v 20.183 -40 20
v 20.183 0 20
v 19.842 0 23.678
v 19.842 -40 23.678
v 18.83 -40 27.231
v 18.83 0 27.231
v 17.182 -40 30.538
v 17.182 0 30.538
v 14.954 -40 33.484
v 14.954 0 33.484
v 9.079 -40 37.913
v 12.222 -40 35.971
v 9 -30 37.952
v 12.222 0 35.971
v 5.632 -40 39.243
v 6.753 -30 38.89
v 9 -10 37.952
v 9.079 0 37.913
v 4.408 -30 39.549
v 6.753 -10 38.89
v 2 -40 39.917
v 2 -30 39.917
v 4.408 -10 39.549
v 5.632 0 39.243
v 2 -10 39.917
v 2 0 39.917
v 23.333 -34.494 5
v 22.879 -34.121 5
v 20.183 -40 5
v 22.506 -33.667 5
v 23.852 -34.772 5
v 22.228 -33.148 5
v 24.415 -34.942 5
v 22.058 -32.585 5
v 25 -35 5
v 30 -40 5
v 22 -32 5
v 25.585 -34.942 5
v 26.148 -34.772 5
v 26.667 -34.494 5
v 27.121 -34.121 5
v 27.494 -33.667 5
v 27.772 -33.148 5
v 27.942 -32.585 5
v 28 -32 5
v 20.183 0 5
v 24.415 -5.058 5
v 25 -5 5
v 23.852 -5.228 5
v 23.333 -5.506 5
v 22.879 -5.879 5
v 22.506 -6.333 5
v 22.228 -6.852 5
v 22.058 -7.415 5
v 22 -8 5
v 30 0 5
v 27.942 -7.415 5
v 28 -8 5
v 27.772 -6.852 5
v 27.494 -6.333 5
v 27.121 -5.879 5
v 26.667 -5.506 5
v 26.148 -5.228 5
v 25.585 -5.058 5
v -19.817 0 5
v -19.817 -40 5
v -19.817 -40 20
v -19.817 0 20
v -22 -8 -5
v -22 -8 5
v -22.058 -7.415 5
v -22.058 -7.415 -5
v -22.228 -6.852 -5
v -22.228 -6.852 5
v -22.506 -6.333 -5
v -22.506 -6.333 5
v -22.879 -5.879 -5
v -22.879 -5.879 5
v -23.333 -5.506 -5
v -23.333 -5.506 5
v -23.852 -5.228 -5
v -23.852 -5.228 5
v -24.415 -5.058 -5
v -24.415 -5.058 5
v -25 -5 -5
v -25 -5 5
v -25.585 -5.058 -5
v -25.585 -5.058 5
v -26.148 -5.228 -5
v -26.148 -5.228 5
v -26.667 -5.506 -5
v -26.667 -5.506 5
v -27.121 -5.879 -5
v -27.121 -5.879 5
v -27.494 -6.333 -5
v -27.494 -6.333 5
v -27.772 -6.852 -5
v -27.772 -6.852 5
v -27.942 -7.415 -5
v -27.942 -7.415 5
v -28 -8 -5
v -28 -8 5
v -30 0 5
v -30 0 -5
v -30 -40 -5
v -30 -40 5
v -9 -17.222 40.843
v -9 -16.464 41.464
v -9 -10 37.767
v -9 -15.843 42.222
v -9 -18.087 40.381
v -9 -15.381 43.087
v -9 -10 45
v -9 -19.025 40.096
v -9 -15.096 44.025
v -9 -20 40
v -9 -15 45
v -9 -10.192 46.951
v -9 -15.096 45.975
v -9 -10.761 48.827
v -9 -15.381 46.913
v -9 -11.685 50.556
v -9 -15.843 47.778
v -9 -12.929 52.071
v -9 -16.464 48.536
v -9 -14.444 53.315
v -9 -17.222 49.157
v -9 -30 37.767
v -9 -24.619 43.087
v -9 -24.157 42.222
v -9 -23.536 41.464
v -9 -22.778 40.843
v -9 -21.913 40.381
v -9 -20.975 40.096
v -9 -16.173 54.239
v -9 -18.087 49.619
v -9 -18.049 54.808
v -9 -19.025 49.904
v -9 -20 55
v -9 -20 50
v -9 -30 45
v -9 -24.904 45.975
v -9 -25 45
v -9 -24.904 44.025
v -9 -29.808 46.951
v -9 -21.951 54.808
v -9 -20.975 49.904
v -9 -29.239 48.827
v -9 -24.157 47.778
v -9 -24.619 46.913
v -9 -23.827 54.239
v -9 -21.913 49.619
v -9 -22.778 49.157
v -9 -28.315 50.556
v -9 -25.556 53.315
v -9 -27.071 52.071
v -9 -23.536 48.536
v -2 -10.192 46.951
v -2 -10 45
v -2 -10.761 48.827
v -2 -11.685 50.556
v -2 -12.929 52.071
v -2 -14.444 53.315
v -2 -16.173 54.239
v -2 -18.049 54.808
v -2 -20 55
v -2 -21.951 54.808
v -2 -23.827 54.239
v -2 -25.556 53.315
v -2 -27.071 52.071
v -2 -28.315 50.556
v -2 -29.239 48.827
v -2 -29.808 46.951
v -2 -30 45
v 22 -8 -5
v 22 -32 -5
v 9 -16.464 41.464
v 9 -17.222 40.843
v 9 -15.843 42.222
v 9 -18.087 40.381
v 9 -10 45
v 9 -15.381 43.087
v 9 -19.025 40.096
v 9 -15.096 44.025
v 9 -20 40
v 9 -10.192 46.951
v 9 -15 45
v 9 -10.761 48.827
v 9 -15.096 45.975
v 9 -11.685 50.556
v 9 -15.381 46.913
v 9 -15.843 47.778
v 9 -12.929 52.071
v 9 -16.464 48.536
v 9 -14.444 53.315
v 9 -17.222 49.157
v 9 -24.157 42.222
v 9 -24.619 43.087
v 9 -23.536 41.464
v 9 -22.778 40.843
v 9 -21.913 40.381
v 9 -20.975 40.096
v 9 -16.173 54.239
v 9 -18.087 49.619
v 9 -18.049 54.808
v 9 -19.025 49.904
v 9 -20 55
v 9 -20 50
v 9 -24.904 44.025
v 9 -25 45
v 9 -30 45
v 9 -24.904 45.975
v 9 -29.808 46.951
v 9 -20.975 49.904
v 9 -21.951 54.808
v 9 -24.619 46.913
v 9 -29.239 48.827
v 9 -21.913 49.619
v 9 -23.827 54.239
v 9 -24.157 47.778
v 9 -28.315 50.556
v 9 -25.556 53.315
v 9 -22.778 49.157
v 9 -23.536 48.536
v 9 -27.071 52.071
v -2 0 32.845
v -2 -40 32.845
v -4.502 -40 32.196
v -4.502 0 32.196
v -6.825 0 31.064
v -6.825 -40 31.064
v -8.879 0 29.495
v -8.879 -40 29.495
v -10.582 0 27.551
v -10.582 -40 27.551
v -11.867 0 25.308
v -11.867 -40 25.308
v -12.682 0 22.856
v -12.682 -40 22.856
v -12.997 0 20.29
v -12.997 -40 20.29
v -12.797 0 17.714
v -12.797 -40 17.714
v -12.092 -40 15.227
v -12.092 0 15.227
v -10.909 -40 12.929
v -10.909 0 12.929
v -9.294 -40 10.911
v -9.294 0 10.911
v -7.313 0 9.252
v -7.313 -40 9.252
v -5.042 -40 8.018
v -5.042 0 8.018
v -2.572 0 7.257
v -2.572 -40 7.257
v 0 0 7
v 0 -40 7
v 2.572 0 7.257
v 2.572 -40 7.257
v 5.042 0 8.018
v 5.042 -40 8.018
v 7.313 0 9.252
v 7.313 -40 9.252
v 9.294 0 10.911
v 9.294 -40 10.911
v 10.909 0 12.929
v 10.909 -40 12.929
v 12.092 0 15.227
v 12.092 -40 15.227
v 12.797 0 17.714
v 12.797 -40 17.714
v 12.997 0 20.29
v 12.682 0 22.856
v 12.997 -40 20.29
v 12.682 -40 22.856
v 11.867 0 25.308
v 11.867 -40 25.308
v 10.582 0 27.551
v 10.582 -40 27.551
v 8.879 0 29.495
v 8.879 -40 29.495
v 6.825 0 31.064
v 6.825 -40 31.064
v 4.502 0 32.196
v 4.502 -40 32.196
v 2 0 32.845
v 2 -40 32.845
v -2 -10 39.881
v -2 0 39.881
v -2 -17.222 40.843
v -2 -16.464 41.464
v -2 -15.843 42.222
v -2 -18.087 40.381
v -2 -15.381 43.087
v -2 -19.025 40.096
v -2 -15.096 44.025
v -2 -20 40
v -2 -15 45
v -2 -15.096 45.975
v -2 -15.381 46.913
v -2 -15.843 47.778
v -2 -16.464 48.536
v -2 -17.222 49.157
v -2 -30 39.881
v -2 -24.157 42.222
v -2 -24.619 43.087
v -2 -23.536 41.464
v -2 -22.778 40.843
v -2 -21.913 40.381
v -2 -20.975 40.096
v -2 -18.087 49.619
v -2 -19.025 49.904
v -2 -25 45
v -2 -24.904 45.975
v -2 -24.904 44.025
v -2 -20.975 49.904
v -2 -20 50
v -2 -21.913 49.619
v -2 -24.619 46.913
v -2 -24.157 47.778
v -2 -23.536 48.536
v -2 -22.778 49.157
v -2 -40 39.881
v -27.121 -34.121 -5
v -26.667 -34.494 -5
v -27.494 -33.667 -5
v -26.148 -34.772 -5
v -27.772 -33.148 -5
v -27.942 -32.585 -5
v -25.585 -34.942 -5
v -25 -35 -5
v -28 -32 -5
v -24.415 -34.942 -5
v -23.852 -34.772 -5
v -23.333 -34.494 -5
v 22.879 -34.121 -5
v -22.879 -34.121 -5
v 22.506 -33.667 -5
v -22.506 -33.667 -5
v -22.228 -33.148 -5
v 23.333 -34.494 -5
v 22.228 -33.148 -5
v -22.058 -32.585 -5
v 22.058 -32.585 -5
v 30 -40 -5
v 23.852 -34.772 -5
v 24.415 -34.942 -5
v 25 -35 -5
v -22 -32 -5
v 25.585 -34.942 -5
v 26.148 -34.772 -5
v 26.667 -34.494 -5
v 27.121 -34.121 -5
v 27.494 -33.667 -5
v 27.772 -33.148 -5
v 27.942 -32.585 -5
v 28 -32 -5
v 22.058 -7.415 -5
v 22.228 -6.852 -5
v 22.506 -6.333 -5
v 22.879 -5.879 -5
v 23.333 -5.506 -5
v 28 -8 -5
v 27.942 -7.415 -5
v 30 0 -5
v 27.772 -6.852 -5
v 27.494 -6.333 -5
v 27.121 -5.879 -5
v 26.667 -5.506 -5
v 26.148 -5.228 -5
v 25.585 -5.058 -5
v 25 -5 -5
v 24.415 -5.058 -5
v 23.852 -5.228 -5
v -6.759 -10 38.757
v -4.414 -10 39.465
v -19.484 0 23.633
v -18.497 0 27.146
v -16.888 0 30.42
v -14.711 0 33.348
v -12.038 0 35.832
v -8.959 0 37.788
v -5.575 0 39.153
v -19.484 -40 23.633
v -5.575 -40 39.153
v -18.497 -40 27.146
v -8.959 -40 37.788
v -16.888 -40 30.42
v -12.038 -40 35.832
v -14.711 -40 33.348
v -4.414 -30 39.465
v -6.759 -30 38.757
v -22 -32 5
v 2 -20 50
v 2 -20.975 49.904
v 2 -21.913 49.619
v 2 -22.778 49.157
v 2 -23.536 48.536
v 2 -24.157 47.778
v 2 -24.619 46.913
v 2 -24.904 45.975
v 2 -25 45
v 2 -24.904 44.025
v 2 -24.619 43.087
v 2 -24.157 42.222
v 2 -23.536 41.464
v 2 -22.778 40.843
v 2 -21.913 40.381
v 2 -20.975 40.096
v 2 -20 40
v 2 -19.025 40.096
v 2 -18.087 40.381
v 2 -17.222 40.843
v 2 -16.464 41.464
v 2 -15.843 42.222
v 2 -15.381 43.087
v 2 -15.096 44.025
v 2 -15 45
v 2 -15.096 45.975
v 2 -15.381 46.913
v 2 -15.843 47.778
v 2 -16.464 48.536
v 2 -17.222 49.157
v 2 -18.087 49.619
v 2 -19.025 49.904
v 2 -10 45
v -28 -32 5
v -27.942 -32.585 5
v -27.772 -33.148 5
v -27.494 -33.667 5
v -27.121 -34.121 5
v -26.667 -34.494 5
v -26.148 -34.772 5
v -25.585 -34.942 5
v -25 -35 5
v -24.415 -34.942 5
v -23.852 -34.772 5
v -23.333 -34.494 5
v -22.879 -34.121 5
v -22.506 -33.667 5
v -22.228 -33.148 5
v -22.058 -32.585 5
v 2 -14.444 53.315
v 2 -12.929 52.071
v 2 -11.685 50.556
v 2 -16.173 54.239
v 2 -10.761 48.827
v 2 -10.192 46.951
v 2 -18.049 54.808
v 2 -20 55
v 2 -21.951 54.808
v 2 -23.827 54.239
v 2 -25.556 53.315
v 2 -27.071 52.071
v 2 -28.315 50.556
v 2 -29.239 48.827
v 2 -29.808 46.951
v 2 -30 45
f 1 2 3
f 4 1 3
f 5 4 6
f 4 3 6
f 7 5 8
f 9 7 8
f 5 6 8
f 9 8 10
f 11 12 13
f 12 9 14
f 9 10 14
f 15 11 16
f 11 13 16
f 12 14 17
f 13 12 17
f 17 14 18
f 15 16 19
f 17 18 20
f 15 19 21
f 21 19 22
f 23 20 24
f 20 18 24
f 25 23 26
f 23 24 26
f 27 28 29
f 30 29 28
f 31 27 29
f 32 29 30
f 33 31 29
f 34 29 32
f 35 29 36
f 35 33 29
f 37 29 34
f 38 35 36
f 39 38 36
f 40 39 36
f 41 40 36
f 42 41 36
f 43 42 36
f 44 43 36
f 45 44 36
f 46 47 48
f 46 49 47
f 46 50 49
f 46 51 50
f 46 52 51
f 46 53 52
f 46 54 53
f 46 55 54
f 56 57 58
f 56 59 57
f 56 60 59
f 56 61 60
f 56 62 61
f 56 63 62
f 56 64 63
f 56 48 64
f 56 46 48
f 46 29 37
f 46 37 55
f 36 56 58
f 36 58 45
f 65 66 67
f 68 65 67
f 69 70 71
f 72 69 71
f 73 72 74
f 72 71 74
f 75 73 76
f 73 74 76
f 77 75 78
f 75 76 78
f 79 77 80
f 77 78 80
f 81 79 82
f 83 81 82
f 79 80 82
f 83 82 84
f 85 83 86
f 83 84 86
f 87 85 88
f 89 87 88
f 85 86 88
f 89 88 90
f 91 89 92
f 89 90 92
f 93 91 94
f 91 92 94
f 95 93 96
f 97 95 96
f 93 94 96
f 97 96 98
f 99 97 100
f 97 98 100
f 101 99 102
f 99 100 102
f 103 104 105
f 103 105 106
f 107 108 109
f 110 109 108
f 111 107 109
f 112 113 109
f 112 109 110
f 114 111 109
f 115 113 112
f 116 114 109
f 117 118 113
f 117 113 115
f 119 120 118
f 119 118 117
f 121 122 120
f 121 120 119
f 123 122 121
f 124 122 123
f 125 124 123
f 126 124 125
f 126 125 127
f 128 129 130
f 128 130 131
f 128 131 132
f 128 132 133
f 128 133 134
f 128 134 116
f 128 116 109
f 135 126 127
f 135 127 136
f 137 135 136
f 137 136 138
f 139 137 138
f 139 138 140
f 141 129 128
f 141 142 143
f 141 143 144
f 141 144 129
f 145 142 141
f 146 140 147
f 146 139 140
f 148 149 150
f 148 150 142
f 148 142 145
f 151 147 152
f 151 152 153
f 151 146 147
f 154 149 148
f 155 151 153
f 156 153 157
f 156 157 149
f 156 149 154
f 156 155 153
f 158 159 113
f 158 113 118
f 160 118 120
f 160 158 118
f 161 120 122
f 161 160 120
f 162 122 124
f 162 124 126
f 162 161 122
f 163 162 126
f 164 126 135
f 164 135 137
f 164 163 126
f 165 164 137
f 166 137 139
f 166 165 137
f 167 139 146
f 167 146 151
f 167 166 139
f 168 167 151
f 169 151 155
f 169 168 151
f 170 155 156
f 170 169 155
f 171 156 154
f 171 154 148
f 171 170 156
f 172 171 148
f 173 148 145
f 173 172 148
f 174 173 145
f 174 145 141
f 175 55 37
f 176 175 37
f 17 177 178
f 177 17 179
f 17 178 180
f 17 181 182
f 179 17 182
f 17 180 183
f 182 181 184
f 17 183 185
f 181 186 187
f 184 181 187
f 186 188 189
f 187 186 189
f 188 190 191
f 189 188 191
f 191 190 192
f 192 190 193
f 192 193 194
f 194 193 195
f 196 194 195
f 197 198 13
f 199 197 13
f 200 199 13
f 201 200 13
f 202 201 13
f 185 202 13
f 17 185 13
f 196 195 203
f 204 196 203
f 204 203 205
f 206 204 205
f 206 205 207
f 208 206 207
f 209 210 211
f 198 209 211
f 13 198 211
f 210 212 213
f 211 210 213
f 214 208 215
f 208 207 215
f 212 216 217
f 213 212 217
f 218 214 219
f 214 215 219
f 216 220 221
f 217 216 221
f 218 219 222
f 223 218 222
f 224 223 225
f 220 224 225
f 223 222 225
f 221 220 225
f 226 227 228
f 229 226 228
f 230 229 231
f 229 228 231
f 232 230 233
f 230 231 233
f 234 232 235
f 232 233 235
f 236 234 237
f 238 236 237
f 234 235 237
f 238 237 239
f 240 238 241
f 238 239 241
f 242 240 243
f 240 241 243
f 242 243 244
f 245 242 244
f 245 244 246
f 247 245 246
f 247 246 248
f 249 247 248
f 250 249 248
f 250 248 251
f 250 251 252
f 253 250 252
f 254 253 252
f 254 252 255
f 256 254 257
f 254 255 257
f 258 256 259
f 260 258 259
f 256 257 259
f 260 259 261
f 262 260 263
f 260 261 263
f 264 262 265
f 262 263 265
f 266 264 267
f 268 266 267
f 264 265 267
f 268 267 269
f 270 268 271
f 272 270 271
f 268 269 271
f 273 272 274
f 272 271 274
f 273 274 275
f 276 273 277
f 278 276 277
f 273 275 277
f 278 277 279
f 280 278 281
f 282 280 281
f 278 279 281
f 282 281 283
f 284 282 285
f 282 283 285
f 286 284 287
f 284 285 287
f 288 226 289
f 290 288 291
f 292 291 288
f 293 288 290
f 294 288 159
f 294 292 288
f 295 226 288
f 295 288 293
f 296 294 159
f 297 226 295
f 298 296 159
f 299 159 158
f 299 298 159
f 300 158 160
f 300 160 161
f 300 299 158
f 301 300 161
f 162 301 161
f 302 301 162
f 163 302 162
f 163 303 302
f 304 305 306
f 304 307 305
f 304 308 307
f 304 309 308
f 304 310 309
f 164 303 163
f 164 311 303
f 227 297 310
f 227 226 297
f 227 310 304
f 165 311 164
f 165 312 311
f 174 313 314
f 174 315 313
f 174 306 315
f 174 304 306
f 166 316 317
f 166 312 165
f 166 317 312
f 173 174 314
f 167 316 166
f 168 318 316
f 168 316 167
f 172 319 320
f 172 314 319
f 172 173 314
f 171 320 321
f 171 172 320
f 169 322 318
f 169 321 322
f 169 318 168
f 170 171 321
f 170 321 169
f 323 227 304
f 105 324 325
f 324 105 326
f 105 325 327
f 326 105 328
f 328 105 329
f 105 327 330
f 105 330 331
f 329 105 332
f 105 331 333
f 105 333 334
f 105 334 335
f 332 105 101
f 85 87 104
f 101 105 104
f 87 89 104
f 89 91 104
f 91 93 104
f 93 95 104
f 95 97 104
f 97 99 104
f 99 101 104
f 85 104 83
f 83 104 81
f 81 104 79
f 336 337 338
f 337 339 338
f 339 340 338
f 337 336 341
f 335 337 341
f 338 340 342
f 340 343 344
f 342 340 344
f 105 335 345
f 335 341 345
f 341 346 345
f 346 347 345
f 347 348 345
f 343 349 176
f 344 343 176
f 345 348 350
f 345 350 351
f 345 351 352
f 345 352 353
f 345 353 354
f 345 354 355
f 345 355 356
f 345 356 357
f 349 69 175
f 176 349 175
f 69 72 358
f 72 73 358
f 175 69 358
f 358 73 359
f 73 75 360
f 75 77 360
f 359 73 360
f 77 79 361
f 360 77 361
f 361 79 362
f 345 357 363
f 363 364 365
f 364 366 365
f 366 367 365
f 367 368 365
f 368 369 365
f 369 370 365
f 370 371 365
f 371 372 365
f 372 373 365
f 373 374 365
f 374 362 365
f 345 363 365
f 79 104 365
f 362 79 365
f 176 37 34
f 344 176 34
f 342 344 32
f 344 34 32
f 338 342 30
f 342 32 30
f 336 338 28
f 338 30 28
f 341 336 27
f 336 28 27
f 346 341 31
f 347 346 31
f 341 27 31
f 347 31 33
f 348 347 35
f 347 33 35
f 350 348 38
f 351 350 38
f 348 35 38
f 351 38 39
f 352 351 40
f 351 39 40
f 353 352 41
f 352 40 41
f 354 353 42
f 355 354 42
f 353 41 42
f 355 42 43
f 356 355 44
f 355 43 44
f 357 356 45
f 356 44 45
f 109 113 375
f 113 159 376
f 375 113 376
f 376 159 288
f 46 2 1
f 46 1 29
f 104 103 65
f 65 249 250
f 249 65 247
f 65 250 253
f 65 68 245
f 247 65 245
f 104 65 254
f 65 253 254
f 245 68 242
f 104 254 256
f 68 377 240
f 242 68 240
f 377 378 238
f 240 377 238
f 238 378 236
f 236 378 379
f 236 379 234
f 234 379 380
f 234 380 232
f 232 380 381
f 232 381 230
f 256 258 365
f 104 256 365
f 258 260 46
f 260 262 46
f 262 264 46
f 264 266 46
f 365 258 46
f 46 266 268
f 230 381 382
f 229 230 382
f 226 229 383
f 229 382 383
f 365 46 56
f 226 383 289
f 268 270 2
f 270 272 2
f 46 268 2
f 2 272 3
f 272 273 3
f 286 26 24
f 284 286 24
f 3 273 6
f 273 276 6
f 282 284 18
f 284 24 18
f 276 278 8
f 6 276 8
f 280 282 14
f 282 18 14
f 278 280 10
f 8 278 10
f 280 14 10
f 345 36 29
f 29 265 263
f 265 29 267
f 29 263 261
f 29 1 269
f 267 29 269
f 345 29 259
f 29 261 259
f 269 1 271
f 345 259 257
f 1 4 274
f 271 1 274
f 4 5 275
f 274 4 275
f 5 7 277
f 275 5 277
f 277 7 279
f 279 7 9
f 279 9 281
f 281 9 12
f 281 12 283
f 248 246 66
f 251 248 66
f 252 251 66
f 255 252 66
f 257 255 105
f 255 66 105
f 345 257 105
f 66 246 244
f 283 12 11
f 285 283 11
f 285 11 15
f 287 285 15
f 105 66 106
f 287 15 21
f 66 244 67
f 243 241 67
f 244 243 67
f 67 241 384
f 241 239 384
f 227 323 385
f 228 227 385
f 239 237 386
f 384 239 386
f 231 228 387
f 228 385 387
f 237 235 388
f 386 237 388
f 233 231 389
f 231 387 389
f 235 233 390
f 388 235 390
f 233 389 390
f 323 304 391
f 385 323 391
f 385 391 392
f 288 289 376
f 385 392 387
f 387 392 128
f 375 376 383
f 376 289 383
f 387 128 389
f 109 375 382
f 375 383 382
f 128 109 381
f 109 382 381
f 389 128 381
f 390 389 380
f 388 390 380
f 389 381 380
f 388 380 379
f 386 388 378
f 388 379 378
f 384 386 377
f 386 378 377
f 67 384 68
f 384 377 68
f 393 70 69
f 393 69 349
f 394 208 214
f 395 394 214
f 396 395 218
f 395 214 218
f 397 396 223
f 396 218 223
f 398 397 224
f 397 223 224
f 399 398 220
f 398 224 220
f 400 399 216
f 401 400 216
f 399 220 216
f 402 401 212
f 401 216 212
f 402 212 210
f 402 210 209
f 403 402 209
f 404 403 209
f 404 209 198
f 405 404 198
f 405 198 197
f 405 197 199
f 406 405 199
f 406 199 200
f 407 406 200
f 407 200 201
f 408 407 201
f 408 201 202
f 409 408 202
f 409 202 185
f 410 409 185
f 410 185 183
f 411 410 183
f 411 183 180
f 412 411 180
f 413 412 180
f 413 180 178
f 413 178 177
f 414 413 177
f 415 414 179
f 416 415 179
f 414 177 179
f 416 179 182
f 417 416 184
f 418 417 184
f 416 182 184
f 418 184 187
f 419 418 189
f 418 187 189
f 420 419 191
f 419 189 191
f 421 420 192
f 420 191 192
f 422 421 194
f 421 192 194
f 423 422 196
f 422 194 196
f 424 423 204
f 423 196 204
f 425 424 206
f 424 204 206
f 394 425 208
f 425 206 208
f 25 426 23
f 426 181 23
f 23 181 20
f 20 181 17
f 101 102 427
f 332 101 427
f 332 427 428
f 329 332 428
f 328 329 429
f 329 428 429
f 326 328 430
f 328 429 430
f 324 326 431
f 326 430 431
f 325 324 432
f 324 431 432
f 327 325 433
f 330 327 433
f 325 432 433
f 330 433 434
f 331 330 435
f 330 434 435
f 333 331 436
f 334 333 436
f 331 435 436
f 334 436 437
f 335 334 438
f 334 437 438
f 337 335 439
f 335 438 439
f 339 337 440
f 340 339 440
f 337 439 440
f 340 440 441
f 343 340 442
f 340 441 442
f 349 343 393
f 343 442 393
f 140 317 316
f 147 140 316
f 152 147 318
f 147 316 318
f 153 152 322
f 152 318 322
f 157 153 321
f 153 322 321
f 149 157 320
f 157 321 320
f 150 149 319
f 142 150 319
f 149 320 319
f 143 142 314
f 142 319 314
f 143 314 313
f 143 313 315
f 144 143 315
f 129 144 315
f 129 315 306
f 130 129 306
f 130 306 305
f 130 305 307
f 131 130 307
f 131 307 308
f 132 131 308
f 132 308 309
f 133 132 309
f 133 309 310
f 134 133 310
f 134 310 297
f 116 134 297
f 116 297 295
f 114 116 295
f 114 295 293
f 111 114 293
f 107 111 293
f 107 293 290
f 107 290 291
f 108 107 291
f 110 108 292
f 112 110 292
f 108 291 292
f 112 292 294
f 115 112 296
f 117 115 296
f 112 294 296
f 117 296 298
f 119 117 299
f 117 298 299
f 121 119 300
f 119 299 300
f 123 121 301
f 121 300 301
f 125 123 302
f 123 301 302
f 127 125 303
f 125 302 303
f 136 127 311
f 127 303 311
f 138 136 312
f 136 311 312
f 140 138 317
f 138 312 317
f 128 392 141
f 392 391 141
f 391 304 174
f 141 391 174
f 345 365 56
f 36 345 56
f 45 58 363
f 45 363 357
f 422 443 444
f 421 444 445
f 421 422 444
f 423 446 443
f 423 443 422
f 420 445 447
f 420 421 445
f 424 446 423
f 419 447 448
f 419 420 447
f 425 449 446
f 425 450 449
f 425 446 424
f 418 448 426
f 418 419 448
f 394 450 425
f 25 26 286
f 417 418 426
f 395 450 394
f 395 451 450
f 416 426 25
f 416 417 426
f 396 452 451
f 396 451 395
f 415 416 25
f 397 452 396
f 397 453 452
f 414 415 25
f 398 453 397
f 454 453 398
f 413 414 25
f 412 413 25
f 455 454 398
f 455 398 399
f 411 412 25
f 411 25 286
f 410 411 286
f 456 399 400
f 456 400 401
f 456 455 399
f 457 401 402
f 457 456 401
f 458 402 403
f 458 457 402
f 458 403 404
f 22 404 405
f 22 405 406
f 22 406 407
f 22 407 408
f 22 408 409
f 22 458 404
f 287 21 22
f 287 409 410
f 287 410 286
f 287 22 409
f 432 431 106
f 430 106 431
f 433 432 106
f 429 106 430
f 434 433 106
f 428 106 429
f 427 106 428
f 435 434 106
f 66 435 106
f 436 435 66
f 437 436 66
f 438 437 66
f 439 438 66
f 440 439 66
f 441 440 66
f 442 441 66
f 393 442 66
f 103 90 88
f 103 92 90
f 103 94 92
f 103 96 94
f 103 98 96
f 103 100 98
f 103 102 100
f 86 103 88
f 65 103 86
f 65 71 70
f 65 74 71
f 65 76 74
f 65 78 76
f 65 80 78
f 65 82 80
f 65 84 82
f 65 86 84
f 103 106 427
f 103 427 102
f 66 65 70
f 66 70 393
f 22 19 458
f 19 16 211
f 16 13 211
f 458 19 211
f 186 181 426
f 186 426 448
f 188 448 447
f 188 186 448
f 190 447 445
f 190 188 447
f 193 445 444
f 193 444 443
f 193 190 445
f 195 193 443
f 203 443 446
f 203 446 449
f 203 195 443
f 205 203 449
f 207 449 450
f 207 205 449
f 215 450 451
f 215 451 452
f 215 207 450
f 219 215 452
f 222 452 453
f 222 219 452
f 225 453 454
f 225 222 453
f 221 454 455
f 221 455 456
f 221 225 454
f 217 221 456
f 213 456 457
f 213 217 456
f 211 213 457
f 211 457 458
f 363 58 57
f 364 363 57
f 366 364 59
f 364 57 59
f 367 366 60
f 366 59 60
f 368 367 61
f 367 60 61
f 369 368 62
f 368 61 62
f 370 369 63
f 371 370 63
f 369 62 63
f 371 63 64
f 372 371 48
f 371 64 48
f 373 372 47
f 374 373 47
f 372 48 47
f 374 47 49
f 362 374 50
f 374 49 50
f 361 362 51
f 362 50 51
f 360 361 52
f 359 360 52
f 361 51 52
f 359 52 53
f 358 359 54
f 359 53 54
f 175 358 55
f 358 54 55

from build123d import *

# Parameters (mm, degrees)
SKETCH_W          = 60
SKETCH_H          = 10
PAD_DEPTH         = 40
PAD001_DEPTH      = 40
PAD002_DEPTH      = 9
PAD002_DEPTH_BACK = 9
SKETCH003_R       = 5
POCKET_DEPTH      = 18
POCKET001_DEPTH   = 40
POCKET002_DEPTH   = 10


with BuildPart() as part:
    # Sketch → Pad (new body)
    with BuildSketch(Plane.XZ):
        Rectangle(SKETCH_W, SKETCH_H)
    extrude(amount=PAD_DEPTH)

    # Sketch001 → Pad001 (join)
    with BuildSketch(Plane.XZ):
        with BuildLine():
            Line((-19.816975, 4.999952), (-19.816975, 20))
            ThreePointArc((20.183025, 19.999952), (0.183049, 40), (-19.816975, 20))
            Line((20.183025, 19.999952), (20.183025, 4.999952))
            Line((20.183025, 4.999952), (-19.816975, 4.999952))
        make_face()
    extrude(amount=PAD001_DEPTH)

    # Sketch002 → Pad002 (join, two sides)
    with BuildSketch(Plane.YZ) as pad002_sk:
        with BuildLine():
            Line((-30, 25), (-30, 45))
            ThreePointArc((-10, 45), (-20, 55), (-30, 45))
            Line((-10, 45), (-10, 25))
            Line((-10, 25), (-30, 25))
        make_face()
    extrude(amount=PAD002_DEPTH)
    extrude(pad002_sk.sketch, amount=-PAD002_DEPTH_BACK)

    # Sketch003 (on Face17 of Pad002) → Pocket (cut)
    with BuildSketch(Plane(origin=(9, 0, 0), x_dir=(0, 0, 1), z_dir=(1, 0, 0))):
        with Locations((45, 20)):
            Circle(SKETCH003_R)
    extrude(amount=-POCKET_DEPTH, mode=Mode.SUBTRACT)

    # Sketch004 (on Face12 of Pocket) → Pocket001 (cut)
    with BuildSketch(Plane.XZ.offset(40)):
        with BuildLine():
            ThreePointArc((-2, 32.845233), (0, 7), (2, 32.845233))
            Line((2, 57.141209), (2, 32.845233))
            Line((-2, 57.141209), (2, 57.141209))
            Line((-2, 32.845233), (-2, 57.141209))
        make_face()
    extrude(amount=-POCKET001_DEPTH, mode=Mode.SUBTRACT)

    # Sketch005 (on Face8 of Pocket001) → Pocket002 (cut)
    with BuildSketch(Plane(origin=(0, 0, 5), x_dir=(-1, 0, 0), z_dir=(0, 0, 1))):
        with BuildLine():
            ThreePointArc((-28, 8), (-25, 5), (-22, 8))
            Line((-22, 8), (-22, 32))
            ThreePointArc((-22, 32), (-25, 35), (-28, 32))
            Line((-28, 8), (-28, 32))
        make_face()
        with BuildLine():
            ThreePointArc((22, 8), (25, 5), (28, 8))
            Line((28, 8), (28, 32))
            ThreePointArc((28, 32), (25, 35), (22, 32))
            Line((22, 8), (22, 32))
        make_face()
    extrude(amount=-POCKET002_DEPTH, mode=Mode.SUBTRACT)


solid = part.part
